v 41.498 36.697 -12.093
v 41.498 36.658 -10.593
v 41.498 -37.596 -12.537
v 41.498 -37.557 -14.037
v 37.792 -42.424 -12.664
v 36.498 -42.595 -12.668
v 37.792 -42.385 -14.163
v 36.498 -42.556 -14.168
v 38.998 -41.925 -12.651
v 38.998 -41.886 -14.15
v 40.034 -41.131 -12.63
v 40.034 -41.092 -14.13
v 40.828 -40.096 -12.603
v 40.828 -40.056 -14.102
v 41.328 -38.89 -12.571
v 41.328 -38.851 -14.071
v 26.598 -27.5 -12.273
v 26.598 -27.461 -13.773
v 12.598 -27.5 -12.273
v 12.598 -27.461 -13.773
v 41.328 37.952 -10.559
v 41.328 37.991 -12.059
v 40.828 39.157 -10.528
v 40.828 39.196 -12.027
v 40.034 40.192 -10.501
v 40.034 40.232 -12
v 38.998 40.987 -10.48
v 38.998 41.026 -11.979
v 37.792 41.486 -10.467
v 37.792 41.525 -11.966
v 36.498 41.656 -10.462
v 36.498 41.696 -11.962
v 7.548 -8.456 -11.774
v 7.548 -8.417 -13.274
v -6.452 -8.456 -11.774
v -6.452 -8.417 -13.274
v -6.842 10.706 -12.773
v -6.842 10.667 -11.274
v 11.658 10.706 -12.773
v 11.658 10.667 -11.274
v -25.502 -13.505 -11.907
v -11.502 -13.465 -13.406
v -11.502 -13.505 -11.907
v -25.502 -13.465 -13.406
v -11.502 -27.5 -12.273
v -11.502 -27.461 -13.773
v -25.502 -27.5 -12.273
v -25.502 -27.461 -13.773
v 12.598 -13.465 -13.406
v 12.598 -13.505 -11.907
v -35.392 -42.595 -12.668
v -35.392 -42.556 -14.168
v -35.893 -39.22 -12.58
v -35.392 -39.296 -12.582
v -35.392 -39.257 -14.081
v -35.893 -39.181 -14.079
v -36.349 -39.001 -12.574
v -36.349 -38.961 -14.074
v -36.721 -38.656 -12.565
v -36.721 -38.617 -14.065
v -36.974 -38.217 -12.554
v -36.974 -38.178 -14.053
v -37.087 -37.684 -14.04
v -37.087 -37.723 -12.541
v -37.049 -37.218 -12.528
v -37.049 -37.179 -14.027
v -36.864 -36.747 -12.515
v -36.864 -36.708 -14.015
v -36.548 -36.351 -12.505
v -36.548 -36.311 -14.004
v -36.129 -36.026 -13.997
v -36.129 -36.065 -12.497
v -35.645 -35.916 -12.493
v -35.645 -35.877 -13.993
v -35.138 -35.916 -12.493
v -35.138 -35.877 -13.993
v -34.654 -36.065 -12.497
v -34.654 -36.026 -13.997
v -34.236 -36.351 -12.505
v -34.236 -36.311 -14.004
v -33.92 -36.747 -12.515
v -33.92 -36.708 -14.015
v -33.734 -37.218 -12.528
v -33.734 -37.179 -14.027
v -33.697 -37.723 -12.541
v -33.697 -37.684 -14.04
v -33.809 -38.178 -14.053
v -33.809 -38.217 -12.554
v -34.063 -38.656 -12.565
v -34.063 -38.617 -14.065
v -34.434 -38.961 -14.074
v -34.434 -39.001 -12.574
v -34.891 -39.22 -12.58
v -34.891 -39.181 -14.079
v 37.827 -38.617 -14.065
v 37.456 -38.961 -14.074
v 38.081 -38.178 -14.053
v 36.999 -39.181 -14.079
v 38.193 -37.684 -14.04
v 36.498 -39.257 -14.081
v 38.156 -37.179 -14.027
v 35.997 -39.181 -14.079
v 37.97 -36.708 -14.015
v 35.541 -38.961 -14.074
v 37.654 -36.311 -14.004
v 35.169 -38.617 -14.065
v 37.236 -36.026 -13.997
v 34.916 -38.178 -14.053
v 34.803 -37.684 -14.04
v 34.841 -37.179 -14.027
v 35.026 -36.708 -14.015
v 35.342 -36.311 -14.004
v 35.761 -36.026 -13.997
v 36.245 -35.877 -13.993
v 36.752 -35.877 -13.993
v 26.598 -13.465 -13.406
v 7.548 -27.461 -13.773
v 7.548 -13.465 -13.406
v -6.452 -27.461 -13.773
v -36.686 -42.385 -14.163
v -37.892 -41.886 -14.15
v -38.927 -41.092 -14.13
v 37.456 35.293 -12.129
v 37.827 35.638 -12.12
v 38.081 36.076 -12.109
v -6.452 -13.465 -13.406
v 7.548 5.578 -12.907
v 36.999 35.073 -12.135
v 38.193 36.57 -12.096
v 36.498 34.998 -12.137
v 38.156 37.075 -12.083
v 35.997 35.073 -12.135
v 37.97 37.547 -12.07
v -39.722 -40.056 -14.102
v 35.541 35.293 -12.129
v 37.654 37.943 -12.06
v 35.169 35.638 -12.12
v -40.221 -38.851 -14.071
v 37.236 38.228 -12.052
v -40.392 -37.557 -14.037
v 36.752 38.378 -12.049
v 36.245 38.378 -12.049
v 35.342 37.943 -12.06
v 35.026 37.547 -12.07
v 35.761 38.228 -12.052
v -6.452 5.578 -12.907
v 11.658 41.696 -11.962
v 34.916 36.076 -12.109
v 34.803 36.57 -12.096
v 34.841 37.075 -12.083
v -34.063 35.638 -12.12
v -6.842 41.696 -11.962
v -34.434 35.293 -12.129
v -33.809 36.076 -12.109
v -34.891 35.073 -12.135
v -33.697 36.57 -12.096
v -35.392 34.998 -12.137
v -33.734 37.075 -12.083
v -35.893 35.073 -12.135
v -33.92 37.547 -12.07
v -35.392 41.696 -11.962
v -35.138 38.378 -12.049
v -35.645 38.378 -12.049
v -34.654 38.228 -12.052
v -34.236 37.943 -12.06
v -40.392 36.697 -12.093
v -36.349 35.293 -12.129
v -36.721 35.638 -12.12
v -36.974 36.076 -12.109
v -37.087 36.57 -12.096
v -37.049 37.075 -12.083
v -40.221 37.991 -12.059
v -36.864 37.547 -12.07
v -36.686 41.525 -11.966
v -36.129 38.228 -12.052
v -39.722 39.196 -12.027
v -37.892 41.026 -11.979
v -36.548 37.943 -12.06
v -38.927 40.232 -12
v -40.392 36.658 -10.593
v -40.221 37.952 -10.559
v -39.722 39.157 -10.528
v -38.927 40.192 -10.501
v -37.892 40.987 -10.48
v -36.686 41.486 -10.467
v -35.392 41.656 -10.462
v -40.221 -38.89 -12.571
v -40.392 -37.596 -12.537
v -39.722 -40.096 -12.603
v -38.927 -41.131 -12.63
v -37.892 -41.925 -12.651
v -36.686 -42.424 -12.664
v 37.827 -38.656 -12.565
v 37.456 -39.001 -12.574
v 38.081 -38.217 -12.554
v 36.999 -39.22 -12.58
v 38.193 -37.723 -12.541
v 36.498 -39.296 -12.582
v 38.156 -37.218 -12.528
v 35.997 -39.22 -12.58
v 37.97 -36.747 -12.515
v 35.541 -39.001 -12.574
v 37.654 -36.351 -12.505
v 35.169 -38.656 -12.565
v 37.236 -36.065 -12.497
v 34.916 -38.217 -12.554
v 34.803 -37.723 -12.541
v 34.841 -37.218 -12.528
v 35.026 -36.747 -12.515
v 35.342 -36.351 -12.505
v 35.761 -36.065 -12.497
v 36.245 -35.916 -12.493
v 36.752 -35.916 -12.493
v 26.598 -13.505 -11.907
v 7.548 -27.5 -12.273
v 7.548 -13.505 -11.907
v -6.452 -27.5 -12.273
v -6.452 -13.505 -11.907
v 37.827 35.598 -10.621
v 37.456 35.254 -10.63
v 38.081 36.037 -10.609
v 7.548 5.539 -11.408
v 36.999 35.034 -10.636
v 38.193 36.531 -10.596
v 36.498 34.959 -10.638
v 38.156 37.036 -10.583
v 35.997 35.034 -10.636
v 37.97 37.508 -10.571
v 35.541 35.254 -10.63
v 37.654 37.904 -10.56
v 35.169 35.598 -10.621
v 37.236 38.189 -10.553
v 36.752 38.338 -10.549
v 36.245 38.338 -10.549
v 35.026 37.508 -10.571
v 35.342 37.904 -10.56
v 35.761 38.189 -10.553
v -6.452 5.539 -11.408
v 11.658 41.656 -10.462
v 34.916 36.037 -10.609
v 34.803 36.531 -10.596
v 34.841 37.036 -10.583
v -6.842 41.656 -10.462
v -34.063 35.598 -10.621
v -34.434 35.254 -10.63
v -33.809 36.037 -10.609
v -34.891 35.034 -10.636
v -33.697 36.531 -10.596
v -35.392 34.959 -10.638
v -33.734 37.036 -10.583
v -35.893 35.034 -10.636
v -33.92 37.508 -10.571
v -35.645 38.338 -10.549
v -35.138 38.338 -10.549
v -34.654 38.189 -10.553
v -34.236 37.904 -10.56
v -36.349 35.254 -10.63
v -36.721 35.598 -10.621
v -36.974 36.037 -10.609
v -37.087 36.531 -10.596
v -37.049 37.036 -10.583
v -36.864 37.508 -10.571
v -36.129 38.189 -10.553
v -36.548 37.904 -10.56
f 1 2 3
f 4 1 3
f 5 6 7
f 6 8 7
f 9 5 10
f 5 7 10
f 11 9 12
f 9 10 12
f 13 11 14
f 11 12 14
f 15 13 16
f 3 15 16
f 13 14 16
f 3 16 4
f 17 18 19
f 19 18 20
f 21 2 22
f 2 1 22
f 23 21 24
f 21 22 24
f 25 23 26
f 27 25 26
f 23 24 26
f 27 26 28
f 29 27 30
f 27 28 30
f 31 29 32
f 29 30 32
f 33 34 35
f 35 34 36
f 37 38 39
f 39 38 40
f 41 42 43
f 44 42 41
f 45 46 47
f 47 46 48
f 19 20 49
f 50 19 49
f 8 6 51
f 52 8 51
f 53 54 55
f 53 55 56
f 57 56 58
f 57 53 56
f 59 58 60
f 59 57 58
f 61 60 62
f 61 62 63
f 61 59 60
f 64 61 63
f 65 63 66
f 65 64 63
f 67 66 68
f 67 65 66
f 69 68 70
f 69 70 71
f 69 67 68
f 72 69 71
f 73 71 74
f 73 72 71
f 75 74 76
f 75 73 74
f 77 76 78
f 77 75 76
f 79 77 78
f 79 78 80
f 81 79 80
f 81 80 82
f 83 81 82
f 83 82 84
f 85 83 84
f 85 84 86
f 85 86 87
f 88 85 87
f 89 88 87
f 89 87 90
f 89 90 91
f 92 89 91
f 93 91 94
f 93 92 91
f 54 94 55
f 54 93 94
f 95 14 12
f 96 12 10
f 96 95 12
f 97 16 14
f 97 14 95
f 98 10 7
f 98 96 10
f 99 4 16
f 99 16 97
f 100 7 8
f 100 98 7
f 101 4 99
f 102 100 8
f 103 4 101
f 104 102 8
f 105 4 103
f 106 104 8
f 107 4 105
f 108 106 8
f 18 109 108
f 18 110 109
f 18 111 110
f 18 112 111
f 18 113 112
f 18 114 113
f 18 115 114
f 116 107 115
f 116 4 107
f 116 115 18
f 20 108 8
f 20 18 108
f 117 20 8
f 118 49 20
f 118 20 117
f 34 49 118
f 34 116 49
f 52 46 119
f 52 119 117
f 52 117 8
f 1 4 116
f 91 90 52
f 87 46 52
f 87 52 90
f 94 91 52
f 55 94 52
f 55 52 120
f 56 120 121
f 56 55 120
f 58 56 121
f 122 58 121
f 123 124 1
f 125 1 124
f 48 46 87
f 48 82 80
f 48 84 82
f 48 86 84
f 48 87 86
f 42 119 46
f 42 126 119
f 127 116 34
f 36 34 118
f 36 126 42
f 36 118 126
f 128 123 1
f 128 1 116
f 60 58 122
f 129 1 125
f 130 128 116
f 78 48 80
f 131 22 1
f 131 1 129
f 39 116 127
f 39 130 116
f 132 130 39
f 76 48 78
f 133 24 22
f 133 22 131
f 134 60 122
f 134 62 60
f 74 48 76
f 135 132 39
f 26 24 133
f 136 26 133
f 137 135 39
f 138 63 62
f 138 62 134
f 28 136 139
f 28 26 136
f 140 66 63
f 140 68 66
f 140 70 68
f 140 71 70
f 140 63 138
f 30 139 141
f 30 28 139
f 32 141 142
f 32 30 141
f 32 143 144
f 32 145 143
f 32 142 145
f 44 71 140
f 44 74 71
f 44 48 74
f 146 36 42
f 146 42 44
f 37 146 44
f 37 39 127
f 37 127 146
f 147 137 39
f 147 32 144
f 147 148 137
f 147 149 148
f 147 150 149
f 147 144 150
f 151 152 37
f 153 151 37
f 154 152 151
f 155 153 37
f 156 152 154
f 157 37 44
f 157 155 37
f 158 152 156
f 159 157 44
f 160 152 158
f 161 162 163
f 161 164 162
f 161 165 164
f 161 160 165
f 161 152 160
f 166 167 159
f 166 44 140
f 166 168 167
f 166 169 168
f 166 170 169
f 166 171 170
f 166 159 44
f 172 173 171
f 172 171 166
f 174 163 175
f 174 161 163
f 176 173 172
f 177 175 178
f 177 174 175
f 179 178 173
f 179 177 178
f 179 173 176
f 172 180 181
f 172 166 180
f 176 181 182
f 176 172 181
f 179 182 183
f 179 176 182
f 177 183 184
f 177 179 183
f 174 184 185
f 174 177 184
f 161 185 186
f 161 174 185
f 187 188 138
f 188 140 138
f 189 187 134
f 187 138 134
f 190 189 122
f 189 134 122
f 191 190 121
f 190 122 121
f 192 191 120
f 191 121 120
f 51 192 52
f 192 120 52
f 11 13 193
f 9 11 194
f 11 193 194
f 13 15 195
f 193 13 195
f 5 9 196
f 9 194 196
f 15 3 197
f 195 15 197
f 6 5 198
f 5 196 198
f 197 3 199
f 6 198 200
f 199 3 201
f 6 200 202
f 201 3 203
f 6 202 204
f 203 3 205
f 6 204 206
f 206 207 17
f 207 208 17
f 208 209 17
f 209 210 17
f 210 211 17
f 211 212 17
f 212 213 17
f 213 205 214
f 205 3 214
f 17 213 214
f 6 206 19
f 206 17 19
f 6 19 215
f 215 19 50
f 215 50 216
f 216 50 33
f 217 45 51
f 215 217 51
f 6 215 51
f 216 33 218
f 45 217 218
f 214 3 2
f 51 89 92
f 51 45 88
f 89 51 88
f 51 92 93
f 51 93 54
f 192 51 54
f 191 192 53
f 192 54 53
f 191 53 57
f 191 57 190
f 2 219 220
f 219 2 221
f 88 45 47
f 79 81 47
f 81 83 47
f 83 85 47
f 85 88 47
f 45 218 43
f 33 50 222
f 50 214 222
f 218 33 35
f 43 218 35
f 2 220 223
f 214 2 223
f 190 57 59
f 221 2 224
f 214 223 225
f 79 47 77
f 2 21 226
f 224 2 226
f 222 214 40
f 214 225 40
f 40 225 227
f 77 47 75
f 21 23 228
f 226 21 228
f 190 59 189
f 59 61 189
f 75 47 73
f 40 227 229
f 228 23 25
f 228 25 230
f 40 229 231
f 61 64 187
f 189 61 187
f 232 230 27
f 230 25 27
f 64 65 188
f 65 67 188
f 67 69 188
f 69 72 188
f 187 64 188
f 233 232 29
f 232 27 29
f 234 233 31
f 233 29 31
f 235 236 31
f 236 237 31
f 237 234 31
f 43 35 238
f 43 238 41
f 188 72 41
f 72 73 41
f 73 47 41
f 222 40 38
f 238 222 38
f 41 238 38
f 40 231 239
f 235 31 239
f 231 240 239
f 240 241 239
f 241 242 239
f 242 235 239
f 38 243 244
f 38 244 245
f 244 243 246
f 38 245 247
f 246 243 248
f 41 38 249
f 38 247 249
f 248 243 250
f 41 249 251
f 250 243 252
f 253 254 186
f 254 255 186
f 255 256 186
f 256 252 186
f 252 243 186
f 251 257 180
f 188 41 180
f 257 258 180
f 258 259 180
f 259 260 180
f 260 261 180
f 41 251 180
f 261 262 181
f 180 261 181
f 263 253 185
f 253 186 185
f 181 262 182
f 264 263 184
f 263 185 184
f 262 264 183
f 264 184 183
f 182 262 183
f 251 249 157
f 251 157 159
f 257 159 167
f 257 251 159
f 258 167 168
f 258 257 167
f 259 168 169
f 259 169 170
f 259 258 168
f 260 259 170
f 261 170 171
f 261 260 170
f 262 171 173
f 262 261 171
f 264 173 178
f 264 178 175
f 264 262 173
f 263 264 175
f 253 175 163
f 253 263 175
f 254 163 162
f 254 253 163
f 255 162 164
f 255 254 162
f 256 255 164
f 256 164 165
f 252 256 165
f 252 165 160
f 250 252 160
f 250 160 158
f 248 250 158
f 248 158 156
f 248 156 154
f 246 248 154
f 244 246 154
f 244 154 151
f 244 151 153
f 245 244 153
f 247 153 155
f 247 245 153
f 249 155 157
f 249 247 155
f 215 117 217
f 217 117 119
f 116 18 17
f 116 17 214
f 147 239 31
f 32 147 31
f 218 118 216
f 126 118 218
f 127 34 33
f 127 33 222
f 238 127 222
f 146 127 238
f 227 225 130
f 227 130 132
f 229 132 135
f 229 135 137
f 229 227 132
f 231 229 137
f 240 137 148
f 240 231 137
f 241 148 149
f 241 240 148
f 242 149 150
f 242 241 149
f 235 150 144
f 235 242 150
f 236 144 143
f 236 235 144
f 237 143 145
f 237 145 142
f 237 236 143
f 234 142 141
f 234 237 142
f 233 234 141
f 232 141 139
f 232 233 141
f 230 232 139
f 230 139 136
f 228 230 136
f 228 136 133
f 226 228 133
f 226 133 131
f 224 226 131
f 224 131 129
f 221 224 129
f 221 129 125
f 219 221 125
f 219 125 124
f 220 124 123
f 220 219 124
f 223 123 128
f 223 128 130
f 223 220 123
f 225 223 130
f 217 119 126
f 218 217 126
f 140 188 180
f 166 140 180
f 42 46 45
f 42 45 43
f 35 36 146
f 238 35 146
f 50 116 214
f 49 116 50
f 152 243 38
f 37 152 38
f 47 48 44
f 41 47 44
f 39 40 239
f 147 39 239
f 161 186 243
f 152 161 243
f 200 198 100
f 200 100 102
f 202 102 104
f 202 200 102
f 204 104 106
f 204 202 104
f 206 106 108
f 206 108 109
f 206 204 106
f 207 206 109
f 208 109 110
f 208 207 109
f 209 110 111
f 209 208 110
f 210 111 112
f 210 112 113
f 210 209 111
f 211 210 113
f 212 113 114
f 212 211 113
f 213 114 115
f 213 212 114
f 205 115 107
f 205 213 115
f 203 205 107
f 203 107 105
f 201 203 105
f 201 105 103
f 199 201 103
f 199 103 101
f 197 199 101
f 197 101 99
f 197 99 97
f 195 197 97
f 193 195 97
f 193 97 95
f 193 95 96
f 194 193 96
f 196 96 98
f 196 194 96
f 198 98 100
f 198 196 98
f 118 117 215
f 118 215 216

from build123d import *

# Parameters (mm, degrees)
SKETCH2_R             = 1.7
BOSS_EXTRUDE3_DEPTH   = 1.5
FILLET4_R             = 5
BODY_MOVE_COPY1_ANGLE = 91.5
BODY_MOVE_COPY2_ANGLE = 180
SKETCH3_W             = 14
SKETCH3_H             = 14
CUT_EXTRUDE6_DEPTH    = 10


with BuildPart() as part:
    # Sketch2 → Boss-Extrude3 (new body)
    with BuildSketch(Plane(origin=(0, 0, 0), x_dir=(1, 0, 0), z_dir=(0, 1, 0))):
        Polygon((41.198193182, -31.056403409), (41.198193182, 53.223596591), (7.648193182, 53.223596591), (7.648193182, 22.223596591), (-10.851806818, 22.223596591), (-10.851806818, 53.223596591), (-40.691806818, 53.223596591), (-40.691806818, -31.056403409), align=None)
        with Locations((-35.691806818, -26.056403409)):
            Circle(SKETCH2_R, mode=Mode.SUBTRACT)
        with Locations((36.198193182, -26.056403409)):
            Circle(SKETCH2_R, mode=Mode.SUBTRACT)
        with Locations((-35.691806818, 48.223596591)):
            Circle(SKETCH2_R, mode=Mode.SUBTRACT)
        with Locations((36.198193182, 48.223596591)):
            Circle(SKETCH2_R, mode=Mode.SUBTRACT)
    extrude(amount=BOSS_EXTRUDE3_DEPTH)

    # Fillet4
    fillet4_edges = [part.edges().sort_by_distance(p)[0] for p in [
        (-40.691806818, 0.75, 31.056403409),
        (41.198193182, 0.75, 31.056403409),
        (41.198193182, 0.75, -53.223596591),
        (-40.691806818, 0.75, -53.223596591),
    ]]
    fillet(fillet4_edges, radius=FILLET4_R)


with BuildPart() as part_1:
    # Body-Move/Copy1: moved
    add(part.part.rotate(Axis((0, 0.75, -12.283596591), (-1, 0, 0)), BODY_MOVE_COPY1_ANGLE))


with BuildPart() as part_2:
    # Body-Move/Copy2: moved
    add(part_1.part.rotate(Axis((0.403193182, 0.75, 0), (0, 0, 1)), BODY_MOVE_COPY2_ANGLE))

    # Sketch3 → Cut-Extrude6 (cut)
    with BuildSketch(Plane(origin=(0, 0.341583523, -13.044548447), x_dir=(-1, 0, 0), z_dir=(-2.1436792936287095e-13, 0.026176948305881326, -0.9996573249756094))):
        with Locations((-19.598193182, -20.81180408)):
            Rectangle(SKETCH3_W, SKETCH3_H)
        with Locations((-0.548193182, -20.81180408)):
            Rectangle(SKETCH3_W, SKETCH3_H)
        with Locations((18.501806818, -20.81180408)):
            Rectangle(SKETCH3_W, SKETCH3_H)
        with Locations((-0.548193182, -1.76180408)):
            Rectangle(SKETCH3_W, SKETCH3_H)
    extrude(amount=-CUT_EXTRUDE6_DEPTH, mode=Mode.SUBTRACT)


solid = part_2.part
